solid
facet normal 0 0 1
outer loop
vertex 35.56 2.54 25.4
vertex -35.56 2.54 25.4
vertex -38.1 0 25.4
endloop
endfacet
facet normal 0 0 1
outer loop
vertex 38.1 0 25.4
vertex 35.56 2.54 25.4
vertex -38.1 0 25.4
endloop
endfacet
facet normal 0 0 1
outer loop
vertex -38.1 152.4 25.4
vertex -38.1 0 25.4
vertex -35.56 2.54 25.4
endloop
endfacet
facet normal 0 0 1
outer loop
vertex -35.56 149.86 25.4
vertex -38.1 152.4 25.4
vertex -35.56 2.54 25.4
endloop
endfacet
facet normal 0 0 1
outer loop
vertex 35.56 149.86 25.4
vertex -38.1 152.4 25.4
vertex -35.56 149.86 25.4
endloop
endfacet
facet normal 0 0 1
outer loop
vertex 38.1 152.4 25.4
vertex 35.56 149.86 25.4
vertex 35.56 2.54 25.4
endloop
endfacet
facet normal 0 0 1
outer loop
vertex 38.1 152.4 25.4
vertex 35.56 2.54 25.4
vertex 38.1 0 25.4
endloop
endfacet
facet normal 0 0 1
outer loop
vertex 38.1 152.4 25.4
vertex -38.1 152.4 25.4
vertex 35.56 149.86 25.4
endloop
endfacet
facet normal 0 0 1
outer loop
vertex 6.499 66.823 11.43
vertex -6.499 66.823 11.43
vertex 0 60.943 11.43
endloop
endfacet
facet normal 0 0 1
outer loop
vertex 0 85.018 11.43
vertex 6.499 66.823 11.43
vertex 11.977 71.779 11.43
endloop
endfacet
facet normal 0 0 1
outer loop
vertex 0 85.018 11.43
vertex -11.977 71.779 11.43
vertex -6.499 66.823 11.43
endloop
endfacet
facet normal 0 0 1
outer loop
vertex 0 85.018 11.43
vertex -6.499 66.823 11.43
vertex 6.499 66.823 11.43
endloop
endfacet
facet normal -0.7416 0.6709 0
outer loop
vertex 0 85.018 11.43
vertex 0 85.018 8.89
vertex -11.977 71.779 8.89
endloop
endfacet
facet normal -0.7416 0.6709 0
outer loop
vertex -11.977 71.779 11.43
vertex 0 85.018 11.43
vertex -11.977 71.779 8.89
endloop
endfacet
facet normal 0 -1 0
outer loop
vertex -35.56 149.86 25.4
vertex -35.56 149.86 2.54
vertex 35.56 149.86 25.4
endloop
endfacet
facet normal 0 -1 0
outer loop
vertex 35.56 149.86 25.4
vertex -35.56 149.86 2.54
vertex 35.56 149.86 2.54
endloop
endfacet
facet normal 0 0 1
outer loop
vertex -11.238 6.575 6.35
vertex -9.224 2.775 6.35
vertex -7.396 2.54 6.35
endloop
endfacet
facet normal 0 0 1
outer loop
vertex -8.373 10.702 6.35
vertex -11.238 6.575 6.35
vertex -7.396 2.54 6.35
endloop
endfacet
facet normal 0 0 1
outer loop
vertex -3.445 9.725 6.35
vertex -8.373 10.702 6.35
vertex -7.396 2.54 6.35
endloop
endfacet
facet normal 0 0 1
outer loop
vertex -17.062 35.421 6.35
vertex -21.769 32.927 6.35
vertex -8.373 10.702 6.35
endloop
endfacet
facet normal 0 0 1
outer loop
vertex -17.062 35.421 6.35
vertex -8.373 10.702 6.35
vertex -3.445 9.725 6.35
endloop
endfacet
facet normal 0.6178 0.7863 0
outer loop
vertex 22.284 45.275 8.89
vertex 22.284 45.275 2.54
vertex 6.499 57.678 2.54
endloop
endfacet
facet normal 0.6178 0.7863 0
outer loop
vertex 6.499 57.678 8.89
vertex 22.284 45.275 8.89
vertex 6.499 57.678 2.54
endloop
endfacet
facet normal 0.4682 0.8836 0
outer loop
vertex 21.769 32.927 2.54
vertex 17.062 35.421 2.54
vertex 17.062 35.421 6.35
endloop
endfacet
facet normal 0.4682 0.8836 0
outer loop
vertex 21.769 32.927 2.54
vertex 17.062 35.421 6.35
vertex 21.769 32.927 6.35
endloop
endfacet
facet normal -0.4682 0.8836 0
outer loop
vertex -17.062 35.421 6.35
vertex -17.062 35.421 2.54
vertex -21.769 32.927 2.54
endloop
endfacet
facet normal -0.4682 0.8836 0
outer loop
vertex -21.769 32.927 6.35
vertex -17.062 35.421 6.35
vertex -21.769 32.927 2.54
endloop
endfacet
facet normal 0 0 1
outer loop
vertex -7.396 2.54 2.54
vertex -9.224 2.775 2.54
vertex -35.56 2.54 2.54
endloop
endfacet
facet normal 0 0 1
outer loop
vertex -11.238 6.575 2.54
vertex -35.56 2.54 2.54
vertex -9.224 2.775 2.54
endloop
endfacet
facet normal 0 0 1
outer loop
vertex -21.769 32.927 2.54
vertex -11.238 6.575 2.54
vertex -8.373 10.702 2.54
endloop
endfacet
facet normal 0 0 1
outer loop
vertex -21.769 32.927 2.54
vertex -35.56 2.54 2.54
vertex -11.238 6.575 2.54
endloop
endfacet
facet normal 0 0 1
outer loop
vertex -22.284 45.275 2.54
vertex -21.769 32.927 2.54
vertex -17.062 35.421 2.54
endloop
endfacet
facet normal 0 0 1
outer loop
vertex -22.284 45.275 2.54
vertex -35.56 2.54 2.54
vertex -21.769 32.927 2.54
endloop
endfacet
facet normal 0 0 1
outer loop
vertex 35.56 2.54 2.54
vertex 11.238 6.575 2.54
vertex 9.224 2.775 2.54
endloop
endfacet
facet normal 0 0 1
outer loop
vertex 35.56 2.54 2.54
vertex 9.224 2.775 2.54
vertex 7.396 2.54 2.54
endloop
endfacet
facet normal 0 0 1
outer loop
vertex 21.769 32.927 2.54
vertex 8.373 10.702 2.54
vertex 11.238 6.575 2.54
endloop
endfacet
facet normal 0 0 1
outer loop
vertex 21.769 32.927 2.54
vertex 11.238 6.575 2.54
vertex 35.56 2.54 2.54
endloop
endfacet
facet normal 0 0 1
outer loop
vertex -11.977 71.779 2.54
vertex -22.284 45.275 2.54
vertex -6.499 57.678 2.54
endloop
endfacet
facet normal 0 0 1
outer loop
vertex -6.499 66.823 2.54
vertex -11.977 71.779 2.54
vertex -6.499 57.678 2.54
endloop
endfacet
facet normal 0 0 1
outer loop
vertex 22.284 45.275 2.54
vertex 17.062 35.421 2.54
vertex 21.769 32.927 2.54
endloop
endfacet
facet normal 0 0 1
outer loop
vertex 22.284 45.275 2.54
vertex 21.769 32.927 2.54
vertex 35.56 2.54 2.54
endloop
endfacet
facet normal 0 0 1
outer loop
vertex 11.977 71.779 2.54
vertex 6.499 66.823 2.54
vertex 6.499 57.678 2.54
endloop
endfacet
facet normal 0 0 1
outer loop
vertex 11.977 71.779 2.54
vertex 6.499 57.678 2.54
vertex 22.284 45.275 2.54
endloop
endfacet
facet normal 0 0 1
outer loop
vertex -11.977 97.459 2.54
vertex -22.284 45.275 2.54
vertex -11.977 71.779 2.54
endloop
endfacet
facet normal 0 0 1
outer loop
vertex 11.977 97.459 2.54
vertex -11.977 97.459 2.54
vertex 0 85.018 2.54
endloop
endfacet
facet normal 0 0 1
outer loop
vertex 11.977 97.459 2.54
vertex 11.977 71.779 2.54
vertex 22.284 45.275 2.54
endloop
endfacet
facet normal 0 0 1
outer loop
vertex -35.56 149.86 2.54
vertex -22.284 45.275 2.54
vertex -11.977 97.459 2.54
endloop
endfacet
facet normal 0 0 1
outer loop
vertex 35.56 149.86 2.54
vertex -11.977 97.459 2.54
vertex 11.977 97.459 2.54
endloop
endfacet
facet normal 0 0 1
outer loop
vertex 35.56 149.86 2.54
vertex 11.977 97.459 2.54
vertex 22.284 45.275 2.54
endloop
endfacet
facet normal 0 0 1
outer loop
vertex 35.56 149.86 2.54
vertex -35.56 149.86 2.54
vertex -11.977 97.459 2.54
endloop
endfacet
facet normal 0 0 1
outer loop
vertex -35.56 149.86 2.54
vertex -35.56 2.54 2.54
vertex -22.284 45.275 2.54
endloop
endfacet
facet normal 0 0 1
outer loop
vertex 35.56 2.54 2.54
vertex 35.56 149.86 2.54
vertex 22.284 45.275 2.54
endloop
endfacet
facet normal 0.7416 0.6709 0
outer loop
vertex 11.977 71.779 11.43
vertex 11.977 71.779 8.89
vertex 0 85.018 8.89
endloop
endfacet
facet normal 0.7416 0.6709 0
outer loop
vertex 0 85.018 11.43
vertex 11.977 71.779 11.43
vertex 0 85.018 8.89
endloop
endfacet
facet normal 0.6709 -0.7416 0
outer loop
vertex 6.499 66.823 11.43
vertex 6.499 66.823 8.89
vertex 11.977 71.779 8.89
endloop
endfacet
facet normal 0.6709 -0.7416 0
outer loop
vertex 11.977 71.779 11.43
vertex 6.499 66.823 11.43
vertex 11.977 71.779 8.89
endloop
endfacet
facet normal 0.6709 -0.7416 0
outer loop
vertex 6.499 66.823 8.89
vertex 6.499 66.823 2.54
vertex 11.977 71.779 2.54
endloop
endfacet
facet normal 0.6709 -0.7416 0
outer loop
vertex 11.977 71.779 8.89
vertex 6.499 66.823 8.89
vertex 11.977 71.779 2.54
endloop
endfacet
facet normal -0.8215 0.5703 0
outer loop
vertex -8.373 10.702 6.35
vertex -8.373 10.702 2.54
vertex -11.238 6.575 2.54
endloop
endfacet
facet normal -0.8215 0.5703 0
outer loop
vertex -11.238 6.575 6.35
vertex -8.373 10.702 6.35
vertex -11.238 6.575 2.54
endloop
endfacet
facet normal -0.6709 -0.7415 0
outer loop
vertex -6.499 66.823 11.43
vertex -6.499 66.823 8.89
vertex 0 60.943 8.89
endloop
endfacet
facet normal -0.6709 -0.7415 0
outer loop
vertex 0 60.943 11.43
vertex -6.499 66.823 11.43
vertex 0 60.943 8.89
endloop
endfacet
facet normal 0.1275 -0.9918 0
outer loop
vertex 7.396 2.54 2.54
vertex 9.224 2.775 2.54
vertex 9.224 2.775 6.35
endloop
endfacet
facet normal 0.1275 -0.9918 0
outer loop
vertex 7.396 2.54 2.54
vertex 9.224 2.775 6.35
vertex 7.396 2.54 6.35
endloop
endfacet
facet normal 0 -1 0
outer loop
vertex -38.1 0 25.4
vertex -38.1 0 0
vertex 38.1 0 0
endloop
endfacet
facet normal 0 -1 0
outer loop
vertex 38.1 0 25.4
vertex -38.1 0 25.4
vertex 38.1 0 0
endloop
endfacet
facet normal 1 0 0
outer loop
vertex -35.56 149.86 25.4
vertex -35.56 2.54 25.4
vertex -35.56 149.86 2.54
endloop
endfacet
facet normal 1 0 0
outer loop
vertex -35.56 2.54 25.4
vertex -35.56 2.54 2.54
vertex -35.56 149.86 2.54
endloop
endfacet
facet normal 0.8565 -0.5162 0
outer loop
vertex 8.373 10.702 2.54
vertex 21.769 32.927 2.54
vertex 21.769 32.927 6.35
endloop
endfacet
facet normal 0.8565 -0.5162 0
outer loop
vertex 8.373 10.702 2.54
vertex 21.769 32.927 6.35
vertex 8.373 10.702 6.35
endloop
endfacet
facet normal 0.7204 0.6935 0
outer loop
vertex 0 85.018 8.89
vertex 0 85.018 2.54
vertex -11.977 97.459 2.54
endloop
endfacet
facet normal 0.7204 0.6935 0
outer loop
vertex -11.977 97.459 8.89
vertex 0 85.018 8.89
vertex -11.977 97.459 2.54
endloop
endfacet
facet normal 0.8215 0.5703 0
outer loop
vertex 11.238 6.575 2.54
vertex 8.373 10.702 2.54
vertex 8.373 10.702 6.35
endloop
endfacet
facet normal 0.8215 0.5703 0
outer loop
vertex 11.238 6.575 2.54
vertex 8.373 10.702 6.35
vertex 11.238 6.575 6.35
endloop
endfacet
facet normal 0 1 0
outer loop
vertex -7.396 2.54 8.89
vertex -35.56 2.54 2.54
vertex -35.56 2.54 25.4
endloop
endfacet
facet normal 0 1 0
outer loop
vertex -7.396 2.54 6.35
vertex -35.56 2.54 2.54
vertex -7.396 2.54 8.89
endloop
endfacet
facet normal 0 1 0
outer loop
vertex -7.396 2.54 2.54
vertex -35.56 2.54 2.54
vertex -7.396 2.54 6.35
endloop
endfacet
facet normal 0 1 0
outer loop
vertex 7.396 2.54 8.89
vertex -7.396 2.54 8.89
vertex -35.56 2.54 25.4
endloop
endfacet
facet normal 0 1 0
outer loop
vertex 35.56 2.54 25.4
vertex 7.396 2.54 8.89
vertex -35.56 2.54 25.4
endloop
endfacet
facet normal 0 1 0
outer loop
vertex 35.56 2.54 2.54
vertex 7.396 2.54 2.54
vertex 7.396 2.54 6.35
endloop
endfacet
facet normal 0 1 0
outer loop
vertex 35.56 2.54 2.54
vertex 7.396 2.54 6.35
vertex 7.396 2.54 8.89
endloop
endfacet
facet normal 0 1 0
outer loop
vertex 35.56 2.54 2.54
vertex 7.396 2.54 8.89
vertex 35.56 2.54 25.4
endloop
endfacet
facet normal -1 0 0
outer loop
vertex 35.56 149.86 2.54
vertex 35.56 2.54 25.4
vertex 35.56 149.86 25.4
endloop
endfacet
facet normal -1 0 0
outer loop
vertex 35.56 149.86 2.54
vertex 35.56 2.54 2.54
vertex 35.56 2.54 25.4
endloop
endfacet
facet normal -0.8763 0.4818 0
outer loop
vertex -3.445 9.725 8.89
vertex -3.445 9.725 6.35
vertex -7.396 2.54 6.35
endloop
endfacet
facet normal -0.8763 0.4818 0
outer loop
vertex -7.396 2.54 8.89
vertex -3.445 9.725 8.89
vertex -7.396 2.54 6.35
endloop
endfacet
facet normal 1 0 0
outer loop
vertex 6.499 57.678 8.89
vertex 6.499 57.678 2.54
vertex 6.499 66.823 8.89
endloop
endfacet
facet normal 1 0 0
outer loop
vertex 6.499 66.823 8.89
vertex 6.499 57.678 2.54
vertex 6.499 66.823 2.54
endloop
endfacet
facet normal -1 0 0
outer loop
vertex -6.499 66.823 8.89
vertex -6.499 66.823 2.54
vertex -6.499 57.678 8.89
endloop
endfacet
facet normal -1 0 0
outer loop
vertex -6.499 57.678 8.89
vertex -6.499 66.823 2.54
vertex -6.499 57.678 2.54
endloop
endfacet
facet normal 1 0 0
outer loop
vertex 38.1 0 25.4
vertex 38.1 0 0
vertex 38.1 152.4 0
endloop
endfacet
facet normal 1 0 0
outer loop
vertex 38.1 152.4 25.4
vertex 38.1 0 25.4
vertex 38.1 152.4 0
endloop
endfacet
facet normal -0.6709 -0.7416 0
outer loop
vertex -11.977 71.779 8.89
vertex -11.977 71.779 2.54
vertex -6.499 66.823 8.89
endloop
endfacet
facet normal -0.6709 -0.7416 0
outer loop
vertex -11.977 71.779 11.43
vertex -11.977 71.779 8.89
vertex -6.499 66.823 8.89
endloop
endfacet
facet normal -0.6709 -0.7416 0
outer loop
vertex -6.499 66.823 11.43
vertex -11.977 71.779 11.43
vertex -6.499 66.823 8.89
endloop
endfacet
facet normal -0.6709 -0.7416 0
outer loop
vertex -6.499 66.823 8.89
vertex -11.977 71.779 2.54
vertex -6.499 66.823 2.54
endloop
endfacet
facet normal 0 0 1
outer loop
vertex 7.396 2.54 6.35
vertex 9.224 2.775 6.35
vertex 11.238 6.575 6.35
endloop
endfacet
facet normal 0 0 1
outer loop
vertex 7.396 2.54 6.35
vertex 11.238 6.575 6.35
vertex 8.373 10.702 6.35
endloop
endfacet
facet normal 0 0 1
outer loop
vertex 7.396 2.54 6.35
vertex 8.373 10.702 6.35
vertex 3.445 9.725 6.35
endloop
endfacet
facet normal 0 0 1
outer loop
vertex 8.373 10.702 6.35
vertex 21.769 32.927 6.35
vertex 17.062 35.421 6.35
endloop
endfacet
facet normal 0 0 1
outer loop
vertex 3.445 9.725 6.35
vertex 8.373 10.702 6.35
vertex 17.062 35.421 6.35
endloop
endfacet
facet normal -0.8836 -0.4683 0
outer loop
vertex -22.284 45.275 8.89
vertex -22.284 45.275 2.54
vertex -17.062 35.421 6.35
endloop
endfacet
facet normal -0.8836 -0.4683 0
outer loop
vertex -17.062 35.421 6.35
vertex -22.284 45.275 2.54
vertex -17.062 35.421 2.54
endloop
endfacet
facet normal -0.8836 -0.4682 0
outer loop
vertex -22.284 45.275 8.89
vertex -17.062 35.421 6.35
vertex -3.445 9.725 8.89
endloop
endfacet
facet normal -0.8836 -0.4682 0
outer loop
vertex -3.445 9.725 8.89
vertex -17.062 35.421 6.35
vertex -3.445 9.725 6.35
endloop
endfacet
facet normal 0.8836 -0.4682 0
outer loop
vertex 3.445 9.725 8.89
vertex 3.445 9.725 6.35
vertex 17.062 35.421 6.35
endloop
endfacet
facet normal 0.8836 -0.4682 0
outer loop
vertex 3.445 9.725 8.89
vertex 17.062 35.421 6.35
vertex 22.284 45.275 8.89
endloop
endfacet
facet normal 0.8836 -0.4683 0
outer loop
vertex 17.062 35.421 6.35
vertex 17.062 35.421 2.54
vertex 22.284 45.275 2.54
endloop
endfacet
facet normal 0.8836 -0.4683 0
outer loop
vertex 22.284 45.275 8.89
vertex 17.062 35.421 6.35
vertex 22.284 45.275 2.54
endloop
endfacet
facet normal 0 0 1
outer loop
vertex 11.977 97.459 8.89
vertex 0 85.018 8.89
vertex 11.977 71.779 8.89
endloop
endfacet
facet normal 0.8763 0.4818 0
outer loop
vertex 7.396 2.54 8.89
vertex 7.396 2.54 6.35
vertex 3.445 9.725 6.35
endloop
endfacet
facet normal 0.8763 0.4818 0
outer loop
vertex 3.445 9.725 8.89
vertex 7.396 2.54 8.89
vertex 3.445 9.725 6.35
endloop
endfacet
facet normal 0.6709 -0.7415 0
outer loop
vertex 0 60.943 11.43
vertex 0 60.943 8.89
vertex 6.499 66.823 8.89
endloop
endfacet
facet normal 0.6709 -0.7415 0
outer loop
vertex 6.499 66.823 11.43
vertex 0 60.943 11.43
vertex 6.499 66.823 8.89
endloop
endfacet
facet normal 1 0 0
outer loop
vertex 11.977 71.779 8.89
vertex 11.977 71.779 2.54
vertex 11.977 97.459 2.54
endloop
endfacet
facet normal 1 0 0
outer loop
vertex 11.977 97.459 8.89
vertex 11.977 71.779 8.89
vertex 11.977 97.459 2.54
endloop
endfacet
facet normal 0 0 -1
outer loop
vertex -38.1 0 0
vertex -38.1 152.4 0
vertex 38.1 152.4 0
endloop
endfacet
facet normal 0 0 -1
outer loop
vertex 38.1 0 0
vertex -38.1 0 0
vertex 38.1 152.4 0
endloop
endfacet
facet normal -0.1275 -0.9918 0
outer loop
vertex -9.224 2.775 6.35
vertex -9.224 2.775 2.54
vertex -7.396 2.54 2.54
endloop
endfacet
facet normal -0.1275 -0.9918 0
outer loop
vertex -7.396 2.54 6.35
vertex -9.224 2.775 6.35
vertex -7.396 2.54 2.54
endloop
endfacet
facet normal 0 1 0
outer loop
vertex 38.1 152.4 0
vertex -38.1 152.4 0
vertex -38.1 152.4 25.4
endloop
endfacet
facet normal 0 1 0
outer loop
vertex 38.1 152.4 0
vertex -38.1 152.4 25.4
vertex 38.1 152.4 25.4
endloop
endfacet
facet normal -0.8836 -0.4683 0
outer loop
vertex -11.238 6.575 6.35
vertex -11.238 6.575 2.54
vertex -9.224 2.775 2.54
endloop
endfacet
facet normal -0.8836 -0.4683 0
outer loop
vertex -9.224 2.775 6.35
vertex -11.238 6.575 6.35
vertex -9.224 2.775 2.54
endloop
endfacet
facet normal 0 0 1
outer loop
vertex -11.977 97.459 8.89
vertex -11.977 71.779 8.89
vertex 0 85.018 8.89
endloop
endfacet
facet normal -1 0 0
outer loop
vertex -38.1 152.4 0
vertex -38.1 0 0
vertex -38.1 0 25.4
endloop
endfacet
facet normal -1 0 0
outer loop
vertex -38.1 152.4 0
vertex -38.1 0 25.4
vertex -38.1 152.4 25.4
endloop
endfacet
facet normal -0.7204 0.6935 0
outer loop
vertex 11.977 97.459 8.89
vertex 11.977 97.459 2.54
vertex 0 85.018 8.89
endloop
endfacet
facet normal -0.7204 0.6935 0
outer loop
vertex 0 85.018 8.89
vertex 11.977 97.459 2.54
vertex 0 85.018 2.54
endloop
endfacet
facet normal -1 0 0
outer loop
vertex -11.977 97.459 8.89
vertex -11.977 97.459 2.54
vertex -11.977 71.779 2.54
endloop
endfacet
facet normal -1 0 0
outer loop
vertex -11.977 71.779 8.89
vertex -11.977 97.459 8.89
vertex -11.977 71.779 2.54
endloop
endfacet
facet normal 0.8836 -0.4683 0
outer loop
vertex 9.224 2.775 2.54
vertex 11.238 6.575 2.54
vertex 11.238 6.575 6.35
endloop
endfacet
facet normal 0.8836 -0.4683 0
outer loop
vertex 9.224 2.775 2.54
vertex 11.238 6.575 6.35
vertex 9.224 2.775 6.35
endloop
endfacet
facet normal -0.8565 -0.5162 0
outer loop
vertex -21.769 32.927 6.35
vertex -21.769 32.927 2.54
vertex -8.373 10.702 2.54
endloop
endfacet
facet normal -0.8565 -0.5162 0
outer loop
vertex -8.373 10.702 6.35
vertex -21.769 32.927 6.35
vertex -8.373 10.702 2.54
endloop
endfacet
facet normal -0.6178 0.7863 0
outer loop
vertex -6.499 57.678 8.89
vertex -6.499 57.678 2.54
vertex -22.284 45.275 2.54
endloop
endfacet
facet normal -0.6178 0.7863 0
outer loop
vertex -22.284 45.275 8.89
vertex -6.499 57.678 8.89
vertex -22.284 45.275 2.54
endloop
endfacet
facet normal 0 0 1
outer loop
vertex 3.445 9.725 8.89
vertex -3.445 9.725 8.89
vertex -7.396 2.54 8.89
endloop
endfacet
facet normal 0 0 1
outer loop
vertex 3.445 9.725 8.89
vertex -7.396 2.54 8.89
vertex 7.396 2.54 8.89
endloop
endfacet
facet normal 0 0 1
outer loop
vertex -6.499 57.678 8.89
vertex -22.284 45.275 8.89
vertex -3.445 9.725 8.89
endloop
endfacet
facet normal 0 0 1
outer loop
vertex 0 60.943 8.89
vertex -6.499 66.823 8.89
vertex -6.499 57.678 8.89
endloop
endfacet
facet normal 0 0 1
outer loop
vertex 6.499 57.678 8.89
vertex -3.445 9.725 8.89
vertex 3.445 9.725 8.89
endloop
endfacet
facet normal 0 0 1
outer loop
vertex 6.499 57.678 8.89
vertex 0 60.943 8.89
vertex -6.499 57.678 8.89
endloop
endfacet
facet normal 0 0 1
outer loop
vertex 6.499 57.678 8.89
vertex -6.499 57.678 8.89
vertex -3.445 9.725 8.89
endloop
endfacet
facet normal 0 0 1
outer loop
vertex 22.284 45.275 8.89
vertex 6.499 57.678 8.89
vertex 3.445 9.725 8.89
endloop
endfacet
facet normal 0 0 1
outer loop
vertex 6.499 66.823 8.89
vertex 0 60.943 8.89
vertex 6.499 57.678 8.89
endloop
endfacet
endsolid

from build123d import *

# Parameters (mm, degrees)
F0_W      = 76.2
F0_H      = 152.4
F1_DEPTH  = 25.4
F2_T      = -2.54
F4_DEPTH  = 6.35
F6_DEPTH  = 8.89
F8_DEPTH  = 6.35
F10_DEPTH = 3.81


# Not quite as in the source:
# - a pattern or mirror of a feature is missing from the dataset's text; its kind, count and spacing are read off the source's solid


with BuildPart() as f1:
    # F0 (on Top) → F1 (new body)
    with BuildSketch(Plane.XY):
        with Locations((0, 76.2)):
            Rectangle(F0_W, F0_H)
    extrude(amount=F1_DEPTH)

    # F2
    f2_openings = [f1.faces().sort_by_distance(p)[0] for p in [
        (0, 76.2, 25.4),
    ]]
    offset(amount=F2_T, openings=f2_openings)

    # F3 (on face) → F4 (join)
    with BuildSketch(Plane.XY.offset(2.54)):
        Polygon((-6.4988862723, 57.677667588), (-22.2837403417, 45.2752783895), (-3.4451077227, 9.7248451784), (-7.3955161497, 2.54), (7.3955161497, 2.54), (3.4451077227, 9.7248451784), (22.2837403417, 45.2752783895), (6.4988862723, 57.677667588), (6.4988862723, 66.8228566647), (0, 60.9430685656), (-6.4988862723, 66.8228566647), align=None)
    extrude(amount=F4_DEPTH)

    # F5 (on face) → F6 (join)
    with BuildSketch(Plane.XY.offset(2.54)):
        Polygon((-6.4988862723, 66.8228566647), (0, 60.9430685656), (6.4988862723, 66.8228566647), (11.9773805831, 71.7794575804), (0, 85.0179677), (-11.9773805831, 71.7794575804), align=None)
    extrude(amount=F6_DEPTH)

    # F7 (on face) → F8 (join)
    with BuildSketch(Plane.XY.offset(2.54)):
        Polygon((11.9773805831, 97.4589511752), (0, 85.0179677), (11.9773805831, 71.7794575804), align=None)
        Polygon((-11.9773805831, 97.4589511752), (-11.9773805831, 71.7794575804), (0, 85.0179677), align=None)
    extrude(amount=F8_DEPTH)

    # F9 (on face) → F10 (join)
    with BuildSketch(Plane.XY.offset(2.54)):
        Polygon((-3.4451077227, 9.7248451784), (-17.0620636054, 35.4214384736), (-21.7691510916, 32.9270921648), (-8.3730621263, 10.7017857954), (-11.2379649654, 6.5747052431), (-9.2242012438, 2.7745264226), (-7.3955161497, 2.54), align=None)
    f10 = extrude(amount=F10_DEPTH)

    # F10_copies: F10 across plane
    add(f10.mirror(Plane(origin=(0, 0, 0), x_dir=(0, 0, 1), z_dir=(1, 0, 0))))


solid = f1.part
